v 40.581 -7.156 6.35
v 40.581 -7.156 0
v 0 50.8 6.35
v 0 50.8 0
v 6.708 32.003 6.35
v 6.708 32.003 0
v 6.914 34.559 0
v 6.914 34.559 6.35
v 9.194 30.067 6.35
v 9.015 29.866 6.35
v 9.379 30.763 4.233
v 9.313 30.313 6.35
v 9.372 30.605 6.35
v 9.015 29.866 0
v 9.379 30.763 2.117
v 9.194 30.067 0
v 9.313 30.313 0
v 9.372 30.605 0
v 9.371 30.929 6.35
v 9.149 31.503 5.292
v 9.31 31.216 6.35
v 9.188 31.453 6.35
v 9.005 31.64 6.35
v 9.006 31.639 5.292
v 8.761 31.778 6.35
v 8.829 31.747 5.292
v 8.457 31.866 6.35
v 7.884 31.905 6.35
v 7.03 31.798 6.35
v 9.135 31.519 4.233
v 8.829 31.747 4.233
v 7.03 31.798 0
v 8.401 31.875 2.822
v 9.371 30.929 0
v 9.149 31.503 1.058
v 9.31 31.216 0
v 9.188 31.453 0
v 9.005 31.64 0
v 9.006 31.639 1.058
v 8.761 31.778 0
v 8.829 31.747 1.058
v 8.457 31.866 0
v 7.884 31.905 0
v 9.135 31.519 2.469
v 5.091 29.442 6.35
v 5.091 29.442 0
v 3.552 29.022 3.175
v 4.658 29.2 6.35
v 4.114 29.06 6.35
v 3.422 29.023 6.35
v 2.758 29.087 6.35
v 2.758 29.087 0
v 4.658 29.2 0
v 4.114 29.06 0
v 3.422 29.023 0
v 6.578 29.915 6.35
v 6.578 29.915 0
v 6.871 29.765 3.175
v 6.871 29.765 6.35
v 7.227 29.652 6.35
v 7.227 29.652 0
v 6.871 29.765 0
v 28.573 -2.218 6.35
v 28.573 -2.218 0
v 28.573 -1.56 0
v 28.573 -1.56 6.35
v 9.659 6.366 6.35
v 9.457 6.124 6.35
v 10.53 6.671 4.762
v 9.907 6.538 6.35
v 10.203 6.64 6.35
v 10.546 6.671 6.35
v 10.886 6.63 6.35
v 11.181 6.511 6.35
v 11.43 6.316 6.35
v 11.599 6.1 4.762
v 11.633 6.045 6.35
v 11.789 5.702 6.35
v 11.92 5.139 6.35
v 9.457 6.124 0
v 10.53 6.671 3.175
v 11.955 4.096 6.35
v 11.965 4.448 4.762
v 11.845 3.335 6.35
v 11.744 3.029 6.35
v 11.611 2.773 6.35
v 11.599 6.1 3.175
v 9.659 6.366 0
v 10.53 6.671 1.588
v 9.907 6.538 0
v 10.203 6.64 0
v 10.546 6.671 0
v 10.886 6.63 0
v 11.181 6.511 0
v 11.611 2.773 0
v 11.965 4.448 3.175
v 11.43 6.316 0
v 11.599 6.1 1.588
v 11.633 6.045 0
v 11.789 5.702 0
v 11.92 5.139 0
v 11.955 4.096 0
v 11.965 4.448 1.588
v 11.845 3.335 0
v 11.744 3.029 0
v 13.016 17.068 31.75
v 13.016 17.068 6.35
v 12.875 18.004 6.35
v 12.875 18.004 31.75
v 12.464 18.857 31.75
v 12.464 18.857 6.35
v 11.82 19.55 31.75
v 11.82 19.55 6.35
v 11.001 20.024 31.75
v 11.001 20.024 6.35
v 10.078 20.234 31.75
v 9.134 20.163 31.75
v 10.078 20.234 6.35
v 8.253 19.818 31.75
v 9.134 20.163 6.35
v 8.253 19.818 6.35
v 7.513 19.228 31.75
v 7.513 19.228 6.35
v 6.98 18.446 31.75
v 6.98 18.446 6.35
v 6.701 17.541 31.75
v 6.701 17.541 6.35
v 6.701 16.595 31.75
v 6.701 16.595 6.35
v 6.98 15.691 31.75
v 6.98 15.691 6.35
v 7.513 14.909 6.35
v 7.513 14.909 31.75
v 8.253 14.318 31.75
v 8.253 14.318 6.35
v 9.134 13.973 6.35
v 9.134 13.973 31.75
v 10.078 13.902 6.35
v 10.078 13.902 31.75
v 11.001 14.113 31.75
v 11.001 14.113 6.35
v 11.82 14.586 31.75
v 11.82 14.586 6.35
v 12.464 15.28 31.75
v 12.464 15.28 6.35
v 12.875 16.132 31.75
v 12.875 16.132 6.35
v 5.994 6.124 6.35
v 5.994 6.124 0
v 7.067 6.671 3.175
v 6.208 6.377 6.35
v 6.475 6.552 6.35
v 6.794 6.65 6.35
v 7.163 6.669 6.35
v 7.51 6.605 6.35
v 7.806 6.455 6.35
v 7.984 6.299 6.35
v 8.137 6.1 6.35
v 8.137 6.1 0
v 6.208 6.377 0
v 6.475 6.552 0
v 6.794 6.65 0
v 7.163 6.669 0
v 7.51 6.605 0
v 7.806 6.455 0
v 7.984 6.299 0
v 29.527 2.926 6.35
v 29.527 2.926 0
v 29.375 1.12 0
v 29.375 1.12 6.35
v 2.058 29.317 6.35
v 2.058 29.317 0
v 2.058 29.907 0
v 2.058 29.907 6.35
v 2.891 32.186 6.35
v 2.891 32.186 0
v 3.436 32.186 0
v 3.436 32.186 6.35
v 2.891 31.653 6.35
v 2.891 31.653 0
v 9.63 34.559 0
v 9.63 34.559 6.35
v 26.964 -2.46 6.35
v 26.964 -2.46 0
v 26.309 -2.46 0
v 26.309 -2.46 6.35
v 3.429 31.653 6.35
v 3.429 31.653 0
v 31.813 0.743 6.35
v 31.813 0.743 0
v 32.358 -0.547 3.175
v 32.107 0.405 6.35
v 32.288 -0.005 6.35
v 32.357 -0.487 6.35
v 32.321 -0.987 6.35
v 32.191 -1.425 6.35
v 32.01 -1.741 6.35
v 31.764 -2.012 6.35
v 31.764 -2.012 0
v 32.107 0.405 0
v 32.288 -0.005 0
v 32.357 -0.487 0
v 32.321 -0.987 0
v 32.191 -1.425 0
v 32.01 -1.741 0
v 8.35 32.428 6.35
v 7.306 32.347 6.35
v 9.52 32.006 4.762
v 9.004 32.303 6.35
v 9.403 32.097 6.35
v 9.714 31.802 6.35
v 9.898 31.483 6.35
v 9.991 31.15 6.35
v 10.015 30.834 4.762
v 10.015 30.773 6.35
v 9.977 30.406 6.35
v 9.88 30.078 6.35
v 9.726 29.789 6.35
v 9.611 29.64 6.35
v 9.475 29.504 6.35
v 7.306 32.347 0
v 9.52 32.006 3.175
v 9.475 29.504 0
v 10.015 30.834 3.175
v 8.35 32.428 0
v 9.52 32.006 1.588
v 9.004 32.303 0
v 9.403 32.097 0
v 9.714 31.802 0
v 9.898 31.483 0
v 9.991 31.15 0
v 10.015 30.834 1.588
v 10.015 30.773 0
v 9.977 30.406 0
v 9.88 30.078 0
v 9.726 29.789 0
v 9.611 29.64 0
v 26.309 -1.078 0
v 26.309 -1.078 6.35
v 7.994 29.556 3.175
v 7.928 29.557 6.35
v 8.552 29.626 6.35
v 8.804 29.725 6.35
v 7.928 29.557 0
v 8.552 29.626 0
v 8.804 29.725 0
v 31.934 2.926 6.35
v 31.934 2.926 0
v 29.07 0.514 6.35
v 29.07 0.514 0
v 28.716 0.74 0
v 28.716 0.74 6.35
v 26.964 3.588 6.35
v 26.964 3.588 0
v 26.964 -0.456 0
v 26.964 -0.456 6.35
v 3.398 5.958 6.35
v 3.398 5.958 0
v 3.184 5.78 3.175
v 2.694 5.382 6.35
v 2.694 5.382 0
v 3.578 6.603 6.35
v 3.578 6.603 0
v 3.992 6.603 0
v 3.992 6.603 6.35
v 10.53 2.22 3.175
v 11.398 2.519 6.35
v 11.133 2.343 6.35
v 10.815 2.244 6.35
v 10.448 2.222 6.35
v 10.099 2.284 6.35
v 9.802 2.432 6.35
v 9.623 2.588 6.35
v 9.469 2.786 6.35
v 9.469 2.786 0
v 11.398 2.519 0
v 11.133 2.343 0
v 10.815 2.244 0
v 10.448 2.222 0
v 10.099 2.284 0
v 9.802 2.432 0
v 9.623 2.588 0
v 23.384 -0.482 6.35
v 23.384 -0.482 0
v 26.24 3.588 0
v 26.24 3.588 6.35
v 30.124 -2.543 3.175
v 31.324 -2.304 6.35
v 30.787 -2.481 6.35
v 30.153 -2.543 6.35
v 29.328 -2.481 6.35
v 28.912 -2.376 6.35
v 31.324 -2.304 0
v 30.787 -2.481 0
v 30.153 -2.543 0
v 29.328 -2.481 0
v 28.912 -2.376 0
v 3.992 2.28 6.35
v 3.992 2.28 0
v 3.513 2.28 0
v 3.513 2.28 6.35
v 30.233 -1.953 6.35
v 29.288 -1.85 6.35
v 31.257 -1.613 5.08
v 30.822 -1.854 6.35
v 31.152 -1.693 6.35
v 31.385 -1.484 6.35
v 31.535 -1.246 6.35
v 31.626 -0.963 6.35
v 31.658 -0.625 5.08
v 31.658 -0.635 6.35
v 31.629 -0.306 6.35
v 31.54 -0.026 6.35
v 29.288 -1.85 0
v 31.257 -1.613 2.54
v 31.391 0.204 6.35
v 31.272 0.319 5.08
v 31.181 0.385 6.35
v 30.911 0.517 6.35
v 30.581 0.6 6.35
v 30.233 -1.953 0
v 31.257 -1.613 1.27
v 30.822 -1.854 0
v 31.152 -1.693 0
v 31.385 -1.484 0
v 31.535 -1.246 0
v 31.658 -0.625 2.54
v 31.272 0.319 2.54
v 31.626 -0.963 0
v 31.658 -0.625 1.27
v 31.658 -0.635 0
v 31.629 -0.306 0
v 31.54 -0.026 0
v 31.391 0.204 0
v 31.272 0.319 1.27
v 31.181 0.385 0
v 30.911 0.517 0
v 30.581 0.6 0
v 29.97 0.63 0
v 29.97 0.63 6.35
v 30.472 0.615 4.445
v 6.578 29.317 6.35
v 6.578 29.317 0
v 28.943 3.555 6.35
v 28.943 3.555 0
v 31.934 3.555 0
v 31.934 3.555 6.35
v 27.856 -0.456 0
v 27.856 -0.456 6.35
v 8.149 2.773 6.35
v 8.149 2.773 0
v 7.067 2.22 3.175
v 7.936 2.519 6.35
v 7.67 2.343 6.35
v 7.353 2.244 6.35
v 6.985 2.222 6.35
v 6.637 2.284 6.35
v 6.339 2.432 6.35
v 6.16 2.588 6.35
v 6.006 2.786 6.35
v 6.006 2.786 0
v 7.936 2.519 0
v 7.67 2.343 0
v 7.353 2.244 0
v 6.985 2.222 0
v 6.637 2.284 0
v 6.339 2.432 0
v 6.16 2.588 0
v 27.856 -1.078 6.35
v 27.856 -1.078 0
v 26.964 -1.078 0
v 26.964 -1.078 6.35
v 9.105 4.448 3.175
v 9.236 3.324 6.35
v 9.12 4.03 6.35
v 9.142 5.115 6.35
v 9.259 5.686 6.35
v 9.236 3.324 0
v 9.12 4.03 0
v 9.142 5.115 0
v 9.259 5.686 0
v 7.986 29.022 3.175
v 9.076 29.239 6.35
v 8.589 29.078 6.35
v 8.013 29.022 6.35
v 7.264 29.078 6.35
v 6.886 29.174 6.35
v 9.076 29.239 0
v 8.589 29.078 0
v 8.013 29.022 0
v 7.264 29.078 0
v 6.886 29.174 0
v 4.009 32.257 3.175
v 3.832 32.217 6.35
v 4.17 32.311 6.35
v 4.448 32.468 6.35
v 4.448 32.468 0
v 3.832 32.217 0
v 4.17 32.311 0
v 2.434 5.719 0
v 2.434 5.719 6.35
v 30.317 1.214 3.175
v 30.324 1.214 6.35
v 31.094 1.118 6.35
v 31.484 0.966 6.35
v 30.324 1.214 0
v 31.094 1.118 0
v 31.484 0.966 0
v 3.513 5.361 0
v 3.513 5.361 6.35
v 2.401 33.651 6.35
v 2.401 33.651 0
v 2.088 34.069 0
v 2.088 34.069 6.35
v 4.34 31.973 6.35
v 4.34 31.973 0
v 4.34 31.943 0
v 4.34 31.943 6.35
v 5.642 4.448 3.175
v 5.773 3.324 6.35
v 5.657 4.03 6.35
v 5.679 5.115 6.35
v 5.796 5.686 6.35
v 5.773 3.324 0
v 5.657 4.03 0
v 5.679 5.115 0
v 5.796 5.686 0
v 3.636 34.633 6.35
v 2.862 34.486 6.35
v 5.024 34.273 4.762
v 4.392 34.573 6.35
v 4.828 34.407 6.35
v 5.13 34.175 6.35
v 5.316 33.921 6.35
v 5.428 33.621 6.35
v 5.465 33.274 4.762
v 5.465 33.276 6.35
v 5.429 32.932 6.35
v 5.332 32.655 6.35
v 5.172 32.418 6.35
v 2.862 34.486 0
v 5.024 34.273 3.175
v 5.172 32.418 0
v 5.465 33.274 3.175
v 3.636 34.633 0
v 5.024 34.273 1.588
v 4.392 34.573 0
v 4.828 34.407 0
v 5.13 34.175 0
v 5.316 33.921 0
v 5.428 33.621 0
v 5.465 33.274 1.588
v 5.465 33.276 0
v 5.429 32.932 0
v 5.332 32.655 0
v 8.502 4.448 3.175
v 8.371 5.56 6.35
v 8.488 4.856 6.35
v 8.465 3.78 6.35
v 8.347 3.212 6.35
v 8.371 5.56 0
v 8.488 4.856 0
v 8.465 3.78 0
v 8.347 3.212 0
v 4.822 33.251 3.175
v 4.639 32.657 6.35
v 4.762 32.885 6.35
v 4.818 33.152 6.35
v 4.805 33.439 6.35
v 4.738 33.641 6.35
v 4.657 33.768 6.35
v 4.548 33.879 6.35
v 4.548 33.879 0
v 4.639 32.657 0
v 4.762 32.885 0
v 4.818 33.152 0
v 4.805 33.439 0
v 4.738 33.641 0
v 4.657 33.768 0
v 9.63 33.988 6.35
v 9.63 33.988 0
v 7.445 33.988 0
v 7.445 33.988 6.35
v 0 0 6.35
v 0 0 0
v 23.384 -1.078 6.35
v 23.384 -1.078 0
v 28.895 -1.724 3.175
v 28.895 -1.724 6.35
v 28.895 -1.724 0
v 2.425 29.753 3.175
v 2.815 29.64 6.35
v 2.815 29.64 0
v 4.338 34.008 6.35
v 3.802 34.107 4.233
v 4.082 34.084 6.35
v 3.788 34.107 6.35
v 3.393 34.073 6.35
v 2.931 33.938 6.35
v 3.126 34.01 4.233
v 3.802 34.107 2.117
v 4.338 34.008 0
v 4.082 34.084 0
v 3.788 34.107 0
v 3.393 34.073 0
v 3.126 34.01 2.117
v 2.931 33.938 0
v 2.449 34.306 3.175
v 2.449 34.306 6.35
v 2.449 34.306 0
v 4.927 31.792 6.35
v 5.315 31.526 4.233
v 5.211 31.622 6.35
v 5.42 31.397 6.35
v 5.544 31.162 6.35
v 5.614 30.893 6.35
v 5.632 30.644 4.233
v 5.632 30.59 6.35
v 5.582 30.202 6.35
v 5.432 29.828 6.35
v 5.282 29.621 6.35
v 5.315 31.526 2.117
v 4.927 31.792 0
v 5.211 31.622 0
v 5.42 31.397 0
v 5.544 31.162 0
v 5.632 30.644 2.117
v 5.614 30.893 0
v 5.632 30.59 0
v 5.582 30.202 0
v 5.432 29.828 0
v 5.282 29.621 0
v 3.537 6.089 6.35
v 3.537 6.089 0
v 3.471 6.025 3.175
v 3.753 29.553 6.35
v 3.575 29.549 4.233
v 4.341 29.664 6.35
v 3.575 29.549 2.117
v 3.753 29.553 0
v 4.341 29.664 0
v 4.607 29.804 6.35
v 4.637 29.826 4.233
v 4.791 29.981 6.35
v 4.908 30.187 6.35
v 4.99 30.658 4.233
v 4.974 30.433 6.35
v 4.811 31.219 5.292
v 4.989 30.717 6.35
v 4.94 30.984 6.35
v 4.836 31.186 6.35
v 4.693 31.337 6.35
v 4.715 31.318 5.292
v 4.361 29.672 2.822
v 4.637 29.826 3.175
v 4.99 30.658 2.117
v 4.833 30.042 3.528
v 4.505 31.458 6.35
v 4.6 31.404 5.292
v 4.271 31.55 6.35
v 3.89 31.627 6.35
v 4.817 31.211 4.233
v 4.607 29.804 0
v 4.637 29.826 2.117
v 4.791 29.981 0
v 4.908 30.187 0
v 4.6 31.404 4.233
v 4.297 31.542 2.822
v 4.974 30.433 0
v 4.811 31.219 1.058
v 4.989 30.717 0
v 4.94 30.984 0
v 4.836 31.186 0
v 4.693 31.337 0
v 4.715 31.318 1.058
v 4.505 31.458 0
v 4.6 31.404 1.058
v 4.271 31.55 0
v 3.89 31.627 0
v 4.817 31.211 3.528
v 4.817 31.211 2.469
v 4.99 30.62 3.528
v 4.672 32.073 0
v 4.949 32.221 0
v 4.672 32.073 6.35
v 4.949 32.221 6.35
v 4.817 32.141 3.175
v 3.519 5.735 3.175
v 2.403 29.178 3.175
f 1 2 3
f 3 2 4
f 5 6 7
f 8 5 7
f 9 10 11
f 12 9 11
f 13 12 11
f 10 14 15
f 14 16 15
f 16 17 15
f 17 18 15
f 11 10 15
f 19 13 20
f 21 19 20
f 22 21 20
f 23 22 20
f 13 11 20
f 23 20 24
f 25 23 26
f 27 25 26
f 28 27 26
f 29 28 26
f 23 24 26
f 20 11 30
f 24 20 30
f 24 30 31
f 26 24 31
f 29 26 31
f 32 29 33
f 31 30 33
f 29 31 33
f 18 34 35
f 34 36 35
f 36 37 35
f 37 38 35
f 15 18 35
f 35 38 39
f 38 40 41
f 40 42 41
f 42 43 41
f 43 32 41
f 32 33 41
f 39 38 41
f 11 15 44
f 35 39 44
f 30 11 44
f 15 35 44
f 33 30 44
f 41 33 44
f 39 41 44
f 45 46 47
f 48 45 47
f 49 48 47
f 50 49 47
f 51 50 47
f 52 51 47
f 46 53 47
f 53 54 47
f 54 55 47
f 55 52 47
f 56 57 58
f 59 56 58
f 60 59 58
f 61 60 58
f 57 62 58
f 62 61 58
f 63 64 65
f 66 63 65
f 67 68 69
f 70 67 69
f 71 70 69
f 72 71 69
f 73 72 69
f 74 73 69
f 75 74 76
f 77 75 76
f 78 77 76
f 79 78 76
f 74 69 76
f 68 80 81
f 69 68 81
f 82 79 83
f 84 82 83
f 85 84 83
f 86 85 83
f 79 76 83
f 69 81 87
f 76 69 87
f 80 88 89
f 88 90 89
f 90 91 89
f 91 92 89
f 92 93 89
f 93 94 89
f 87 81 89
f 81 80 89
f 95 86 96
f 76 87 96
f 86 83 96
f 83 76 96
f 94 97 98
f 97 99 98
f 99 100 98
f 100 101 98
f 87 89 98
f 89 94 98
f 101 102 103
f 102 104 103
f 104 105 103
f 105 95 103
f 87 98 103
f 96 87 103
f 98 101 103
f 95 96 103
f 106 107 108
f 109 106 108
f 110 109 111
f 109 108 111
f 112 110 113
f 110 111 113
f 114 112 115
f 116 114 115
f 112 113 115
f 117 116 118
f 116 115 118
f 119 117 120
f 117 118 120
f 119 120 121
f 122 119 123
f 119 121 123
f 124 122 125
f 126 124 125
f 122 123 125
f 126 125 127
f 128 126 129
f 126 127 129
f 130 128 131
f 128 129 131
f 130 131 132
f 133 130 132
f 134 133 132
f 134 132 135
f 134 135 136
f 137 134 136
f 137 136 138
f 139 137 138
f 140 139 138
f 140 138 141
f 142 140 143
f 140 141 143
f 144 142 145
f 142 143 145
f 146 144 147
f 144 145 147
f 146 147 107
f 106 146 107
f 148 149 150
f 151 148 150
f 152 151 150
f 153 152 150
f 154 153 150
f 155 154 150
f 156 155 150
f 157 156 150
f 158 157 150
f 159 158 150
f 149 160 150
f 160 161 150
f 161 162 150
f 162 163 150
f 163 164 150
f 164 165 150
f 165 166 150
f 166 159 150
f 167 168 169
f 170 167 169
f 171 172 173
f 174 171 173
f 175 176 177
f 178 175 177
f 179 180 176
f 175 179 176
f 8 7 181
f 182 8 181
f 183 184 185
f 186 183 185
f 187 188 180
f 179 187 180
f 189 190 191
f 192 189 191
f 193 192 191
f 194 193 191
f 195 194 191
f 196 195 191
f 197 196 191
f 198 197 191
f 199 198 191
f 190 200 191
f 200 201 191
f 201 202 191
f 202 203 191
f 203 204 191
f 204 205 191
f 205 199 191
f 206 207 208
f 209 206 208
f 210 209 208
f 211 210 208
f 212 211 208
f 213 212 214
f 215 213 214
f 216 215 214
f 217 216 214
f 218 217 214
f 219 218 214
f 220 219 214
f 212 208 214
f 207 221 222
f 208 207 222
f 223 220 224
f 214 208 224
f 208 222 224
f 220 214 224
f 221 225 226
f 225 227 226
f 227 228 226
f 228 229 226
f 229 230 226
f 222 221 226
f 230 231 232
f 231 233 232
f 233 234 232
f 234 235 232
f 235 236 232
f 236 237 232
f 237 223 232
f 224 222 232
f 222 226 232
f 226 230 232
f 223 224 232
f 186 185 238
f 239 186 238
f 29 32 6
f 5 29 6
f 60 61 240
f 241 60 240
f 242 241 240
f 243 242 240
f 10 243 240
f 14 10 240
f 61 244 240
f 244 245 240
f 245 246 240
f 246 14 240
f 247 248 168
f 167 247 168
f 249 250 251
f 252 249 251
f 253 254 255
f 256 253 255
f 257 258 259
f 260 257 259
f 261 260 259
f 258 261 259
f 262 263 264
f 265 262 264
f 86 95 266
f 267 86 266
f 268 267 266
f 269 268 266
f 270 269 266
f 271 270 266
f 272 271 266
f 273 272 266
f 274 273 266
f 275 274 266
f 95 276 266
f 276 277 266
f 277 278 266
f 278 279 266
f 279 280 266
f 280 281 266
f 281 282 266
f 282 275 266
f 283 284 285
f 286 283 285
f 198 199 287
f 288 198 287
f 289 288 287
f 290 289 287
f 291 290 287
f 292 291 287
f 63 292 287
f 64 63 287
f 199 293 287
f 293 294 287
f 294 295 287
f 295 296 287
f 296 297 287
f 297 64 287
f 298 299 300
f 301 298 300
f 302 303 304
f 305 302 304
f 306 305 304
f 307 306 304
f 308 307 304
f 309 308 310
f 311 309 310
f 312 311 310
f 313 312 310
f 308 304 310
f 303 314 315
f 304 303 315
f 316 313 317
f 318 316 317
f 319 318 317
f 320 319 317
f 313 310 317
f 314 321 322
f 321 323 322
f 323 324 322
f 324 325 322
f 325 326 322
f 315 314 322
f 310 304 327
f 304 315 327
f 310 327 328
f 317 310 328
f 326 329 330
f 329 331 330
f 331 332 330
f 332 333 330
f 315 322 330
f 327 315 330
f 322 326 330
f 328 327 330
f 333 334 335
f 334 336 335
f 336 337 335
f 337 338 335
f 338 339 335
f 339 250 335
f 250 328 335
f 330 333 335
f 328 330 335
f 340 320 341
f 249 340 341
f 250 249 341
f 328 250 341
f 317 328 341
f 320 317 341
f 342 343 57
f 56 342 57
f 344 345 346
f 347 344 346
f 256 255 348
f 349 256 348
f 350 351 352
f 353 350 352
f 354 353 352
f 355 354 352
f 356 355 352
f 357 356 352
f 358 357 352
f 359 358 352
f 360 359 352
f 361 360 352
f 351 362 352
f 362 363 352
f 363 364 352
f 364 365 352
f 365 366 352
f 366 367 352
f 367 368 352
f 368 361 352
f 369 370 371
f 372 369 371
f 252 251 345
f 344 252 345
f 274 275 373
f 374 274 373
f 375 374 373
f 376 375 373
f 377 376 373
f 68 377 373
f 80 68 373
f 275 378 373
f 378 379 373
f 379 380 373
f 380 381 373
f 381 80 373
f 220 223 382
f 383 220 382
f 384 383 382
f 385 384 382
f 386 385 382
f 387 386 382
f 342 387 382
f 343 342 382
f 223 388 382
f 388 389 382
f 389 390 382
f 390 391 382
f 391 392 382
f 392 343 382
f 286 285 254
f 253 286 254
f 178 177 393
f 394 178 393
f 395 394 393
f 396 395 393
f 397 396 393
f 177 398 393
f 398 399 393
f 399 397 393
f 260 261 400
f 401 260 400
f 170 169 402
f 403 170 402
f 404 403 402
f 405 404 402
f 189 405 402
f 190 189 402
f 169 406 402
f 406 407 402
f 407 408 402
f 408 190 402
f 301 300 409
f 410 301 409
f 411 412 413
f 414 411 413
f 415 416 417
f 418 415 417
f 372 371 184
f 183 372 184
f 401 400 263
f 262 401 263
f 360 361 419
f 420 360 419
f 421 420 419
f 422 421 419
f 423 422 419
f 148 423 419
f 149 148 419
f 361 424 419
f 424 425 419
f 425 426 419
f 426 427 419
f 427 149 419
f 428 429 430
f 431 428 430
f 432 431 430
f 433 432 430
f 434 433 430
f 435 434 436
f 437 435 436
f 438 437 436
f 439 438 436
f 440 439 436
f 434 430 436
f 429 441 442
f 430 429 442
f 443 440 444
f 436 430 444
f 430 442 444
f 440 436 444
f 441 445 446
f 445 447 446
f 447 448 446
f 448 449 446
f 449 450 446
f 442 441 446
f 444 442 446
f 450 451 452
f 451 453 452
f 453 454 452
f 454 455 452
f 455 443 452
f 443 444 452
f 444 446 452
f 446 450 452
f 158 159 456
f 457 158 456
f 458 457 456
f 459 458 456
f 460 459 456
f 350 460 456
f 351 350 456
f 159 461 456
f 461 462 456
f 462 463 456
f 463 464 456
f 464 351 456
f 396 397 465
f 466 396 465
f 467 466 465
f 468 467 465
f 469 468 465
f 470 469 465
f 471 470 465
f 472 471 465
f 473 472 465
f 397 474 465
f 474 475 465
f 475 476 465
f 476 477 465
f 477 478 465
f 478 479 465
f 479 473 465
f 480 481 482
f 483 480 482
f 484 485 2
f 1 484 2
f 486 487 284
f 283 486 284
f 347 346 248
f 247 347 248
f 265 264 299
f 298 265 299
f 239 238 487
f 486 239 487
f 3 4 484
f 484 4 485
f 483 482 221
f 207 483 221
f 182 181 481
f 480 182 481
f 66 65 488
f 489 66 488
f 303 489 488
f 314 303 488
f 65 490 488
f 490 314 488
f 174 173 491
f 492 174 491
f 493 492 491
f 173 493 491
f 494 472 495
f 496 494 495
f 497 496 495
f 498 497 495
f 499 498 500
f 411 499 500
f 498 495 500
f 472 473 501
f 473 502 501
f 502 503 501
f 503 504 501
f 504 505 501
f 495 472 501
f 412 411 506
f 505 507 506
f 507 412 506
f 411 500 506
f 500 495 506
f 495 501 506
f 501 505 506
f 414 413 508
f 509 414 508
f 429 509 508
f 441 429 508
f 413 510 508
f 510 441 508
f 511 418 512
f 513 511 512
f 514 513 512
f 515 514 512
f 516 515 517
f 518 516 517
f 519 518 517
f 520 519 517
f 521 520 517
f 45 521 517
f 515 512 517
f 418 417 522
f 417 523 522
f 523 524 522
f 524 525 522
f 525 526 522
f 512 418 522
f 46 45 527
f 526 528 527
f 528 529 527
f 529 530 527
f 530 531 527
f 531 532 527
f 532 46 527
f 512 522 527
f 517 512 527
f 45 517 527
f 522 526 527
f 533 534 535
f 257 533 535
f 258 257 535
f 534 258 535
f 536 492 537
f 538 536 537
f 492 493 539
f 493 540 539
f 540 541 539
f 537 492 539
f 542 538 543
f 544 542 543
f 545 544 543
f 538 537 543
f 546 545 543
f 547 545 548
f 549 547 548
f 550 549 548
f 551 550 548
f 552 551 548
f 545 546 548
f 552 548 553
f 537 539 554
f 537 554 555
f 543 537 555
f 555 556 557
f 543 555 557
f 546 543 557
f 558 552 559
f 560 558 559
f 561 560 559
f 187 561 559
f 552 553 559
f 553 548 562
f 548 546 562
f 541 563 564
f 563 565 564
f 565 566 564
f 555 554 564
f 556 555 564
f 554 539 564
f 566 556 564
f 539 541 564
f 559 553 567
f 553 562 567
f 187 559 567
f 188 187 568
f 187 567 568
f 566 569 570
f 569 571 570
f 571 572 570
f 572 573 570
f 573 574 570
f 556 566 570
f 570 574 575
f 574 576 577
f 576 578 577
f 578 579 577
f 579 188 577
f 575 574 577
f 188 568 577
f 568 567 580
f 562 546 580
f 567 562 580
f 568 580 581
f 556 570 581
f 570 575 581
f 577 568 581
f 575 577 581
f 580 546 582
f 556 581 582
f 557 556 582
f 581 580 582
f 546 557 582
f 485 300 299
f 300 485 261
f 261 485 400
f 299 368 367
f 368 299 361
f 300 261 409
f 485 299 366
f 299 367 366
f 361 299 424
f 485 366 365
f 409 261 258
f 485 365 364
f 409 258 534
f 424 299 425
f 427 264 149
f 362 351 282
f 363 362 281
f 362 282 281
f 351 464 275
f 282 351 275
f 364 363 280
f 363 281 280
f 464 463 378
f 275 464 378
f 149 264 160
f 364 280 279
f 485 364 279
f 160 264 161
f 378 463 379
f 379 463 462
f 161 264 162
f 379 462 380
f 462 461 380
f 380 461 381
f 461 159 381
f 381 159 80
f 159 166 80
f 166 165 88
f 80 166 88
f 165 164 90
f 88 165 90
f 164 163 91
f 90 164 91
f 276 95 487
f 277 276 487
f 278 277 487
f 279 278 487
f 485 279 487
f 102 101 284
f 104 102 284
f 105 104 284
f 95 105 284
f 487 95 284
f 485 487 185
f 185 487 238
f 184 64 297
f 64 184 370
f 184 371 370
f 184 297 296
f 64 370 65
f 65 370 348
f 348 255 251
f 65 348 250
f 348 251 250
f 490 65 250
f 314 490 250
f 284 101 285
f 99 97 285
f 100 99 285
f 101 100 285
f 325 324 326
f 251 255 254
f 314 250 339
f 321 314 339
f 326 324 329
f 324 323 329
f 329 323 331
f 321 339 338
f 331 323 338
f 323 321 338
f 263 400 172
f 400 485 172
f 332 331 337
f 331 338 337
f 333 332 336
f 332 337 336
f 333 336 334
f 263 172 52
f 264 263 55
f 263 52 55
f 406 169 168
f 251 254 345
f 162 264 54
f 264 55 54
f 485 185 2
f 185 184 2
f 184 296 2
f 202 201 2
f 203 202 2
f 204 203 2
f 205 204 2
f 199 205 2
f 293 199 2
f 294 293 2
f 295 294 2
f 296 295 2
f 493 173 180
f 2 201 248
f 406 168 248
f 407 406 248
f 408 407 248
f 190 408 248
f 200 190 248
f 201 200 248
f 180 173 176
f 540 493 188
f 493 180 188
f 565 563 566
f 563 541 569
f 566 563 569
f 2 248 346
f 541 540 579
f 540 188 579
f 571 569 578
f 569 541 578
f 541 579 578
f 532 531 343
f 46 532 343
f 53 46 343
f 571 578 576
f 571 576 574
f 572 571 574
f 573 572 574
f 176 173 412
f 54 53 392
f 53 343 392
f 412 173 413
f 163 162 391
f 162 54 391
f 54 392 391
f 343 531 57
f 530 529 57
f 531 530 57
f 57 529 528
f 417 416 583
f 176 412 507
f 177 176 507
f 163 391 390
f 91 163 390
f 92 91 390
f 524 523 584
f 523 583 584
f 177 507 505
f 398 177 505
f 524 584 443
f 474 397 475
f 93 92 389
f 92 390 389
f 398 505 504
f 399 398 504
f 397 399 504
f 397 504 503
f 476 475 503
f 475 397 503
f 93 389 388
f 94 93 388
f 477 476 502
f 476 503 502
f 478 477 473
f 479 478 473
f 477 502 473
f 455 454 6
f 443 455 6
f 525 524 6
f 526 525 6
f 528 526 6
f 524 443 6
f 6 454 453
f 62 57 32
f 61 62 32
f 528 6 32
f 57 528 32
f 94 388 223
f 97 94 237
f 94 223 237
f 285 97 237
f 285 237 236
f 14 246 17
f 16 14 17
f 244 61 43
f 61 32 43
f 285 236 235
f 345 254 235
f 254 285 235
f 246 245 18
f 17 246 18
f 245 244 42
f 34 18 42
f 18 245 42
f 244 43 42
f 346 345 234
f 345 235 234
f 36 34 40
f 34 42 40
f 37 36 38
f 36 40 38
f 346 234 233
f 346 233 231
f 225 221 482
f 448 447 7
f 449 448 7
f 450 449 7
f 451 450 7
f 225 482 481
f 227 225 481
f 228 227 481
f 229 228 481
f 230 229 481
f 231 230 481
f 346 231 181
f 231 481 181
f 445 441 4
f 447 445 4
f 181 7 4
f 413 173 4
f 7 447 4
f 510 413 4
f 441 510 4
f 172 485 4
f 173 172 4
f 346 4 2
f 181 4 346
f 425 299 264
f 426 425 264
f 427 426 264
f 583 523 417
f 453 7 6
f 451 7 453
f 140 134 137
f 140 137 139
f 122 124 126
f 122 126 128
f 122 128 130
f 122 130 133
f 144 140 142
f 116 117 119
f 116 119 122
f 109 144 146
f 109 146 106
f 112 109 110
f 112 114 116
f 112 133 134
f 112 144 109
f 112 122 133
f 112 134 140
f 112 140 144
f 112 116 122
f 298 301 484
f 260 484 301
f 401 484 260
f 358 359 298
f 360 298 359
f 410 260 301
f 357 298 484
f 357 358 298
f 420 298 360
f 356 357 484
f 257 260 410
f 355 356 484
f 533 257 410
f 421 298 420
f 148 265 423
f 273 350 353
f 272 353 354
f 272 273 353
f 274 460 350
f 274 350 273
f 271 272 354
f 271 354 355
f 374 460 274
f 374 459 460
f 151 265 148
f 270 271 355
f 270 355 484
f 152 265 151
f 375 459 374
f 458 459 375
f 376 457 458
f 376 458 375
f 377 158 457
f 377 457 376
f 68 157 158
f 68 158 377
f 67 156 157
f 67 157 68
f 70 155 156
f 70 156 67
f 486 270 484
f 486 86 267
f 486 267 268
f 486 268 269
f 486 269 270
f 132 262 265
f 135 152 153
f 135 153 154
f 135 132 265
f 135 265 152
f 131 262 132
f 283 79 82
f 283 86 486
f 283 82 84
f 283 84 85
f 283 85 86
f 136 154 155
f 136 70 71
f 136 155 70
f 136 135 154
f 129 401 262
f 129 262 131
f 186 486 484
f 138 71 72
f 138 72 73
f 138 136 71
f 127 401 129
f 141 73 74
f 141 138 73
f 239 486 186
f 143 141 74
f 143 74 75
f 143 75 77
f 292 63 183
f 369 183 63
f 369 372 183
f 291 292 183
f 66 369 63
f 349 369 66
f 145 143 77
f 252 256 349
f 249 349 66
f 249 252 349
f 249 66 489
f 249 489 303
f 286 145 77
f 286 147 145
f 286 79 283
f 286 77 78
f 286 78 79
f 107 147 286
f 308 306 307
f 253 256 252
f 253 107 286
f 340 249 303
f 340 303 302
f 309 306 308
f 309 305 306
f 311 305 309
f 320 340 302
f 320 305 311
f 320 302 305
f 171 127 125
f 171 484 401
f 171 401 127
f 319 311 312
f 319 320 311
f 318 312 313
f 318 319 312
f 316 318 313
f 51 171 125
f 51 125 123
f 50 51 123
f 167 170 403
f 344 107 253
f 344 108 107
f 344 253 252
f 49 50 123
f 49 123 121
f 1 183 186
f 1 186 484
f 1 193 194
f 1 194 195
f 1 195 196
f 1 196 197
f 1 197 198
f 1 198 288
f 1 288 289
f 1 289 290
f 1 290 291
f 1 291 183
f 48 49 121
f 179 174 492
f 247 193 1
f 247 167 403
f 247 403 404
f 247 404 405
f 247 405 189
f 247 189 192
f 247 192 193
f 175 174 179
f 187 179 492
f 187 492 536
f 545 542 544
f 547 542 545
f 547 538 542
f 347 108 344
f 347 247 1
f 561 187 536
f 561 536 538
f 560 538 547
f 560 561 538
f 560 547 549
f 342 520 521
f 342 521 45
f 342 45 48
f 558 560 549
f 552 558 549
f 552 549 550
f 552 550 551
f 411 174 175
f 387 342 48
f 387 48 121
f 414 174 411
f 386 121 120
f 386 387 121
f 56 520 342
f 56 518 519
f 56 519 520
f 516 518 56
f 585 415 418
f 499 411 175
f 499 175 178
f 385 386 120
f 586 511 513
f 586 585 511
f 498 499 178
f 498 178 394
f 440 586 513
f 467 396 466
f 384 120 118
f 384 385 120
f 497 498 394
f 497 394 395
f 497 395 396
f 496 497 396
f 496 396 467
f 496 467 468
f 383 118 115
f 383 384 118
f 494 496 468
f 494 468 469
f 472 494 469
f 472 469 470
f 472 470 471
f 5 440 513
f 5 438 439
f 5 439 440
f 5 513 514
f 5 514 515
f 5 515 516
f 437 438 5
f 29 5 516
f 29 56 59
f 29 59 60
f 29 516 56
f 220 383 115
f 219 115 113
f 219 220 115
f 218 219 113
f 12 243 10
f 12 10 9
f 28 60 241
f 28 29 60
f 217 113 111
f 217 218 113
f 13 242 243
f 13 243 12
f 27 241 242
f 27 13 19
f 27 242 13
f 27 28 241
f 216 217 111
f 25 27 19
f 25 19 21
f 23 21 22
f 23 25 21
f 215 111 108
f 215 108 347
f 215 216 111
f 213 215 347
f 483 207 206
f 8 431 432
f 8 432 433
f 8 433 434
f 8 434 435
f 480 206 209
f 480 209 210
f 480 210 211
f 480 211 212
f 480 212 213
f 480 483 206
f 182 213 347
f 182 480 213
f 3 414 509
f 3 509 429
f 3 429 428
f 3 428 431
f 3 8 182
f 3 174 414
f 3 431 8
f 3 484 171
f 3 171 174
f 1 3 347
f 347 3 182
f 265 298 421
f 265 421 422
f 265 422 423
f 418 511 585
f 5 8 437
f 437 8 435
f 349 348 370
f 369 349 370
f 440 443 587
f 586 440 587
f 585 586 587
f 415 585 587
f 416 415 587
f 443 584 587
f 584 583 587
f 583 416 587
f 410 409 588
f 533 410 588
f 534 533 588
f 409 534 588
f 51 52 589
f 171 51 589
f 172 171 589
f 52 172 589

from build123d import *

# Parameters (mm, degrees)
F1_DEPTH = 6.35
F2_R     = 3.175
F3_DEPTH = 25.4


with BuildPart() as f1:
    # F0 (on Top) → F1 (new body)
    with BuildSketch(Plane.XY):
        Polygon((0, 50.8), (0, 0), (40.5808809275, -7.1555042084), align=None)
        with BuildLine():
            Line((3.9918560175, 6.6033309618), (3.9918560175, 2.2795035038))
            Line((3.9918560175, 2.2795035038), (3.5130079777, 2.2795035038))
            Line((3.5130079777, 2.2795035038), (3.5130079777, 5.3607865423))
            add(Edge.make_bspline(
                [(3.5130079777, 5.3607865423), (3.5130079777, 5.7459469222), (3.5366664777, 6.088522002)],
                knots=[0, 0, 0, 1, 1, 1], degree=2))
            add(Edge.make_bspline(
                [(3.5366664777, 6.088522002), (3.4751543778, 6.026063562), (3.3980276678, 5.9584002521)],
                knots=[0, 0, 0, 1, 1, 1], degree=2))
            add(Edge.make_bspline(
                [(3.3980276678, 5.9584002521), (3.3209009578, 5.8907369421), (2.6944238781, 5.3816060223)],
                knots=[0, 0, 0, 1, 1, 1], degree=2))
            Line((2.6944238781, 5.3816060223), (2.4341803783, 5.7185030622))
            Line((2.4341803783, 5.7185030622), (3.5783054377, 6.6033309618))
            Line((3.5783054377, 6.6033309618), (3.9918560175, 6.6033309618))
        make_face(mode=Mode.SUBTRACT)
        with BuildLine():
            add(Edge.make_bspline(
                [(8.1368252155, 6.100351252), (8.5021124554, 5.5292350623), (8.5021124554, 4.4475684428)],
                knots=[0, 0, 0, 1, 1, 1], degree=2))
            add(Edge.make_bspline(
                [(8.5021124554, 4.4475684428), (8.5021124554, 3.3261555433), (8.1486544655, 2.7730198136)],
                knots=[0, 0, 0, 1, 1, 1], degree=2))
            add(Edge.make_bspline(
                [(8.1486544655, 2.7730198136), (7.7951964757, 2.2198840838), (7.067461016, 2.2198840838)],
                knots=[0, 0, 0, 1, 1, 1], degree=2))
            add(Edge.make_bspline(
                [(7.067461016, 2.2198840838), (6.3700084364, 2.2198840838), (6.0061407066, 2.7862685736)],
                knots=[0, 0, 0, 1, 1, 1], degree=2))
            add(Edge.make_bspline(
                [(6.0061407066, 2.7862685736), (5.6422729767, 3.3526530633), (5.6422729767, 4.4475684428)],
                knots=[0, 0, 0, 1, 1, 1], degree=2))
            add(Edge.make_bspline(
                [(5.6422729767, 4.4475684428), (5.6422729767, 5.5765520622), (5.9943114566, 6.124009752)],
                knots=[0, 0, 0, 1, 1, 1], degree=2))
            add(Edge.make_bspline(
                [(5.9943114566, 6.124009752), (6.3463499364, 6.6714674417), (7.067461016, 6.6714674417)],
                knots=[0, 0, 0, 1, 1, 1], degree=2))
            add(Edge.make_bspline(
                [(7.067461016, 6.6714674417), (7.7715379757, 6.6714674417), (8.1368252155, 6.100351252)],
                knots=[0, 0, 0, 1, 1, 1], degree=2))
        make_face(mode=Mode.SUBTRACT)
        with BuildLine():
            add(Edge.make_bspline(
                [(11.5994832739, 6.100351252), (11.9647705137, 5.5292350623), (11.9647705137, 4.4475684428)],
                knots=[0, 0, 0, 1, 1, 1], degree=2))
            add(Edge.make_bspline(
                [(11.9647705137, 4.4475684428), (11.9647705137, 3.3261555433), (11.6113125239, 2.7730198136)],
                knots=[0, 0, 0, 1, 1, 1], degree=2))
            add(Edge.make_bspline(
                [(11.6113125239, 2.7730198136), (11.2578545341, 2.2198840838), (10.5301190744, 2.2198840838)],
                knots=[0, 0, 0, 1, 1, 1], degree=2))
            add(Edge.make_bspline(
                [(10.5301190744, 2.2198840838), (9.8326664947, 2.2198840838), (9.4687987649, 2.7862685736)],
                knots=[0, 0, 0, 1, 1, 1], degree=2))
            add(Edge.make_bspline(
                [(9.4687987649, 2.7862685736), (9.1049310351, 3.3526530633), (9.1049310351, 4.4475684428)],
                knots=[0, 0, 0, 1, 1, 1], degree=2))
            add(Edge.make_bspline(
                [(9.1049310351, 4.4475684428), (9.1049310351, 5.5765520622), (9.4569695149, 6.124009752)],
                knots=[0, 0, 0, 1, 1, 1], degree=2))
            add(Edge.make_bspline(
                [(9.4569695149, 6.124009752), (9.8090079947, 6.6714674417), (10.5301190744, 6.6714674417)],
                knots=[0, 0, 0, 1, 1, 1], degree=2))
            add(Edge.make_bspline(
                [(10.5301190744, 6.6714674417), (11.2341960341, 6.6714674417), (11.5994832739, 6.100351252)],
                knots=[0, 0, 0, 1, 1, 1], degree=2))
        make_face(mode=Mode.SUBTRACT)
        Polygon((27.8564916644, -0.4564887798), (27.8564916644, -1.0779461554), (26.9638050104, -1.0779461554), (26.9638050104, -2.4604254868), (26.3094314602, -2.4604254868), (26.3094314602, -1.0779461554), (23.3838418656, -1.0779461554), (23.3838418656, -0.4815050725), (26.2396491701, 3.5882507497), (26.9638050104, 3.5882507497), (26.9638050104, -0.4564887798), align=None, mode=Mode.SUBTRACT)
        with BuildLine():
            add(Edge.make_bspline(
                [(29.3745856349, 1.119537658), (29.8472619015, 1.2143362407), (30.3173048742, 1.2143362407)],
                knots=[0, 0, 0, 1, 1, 1], degree=2))
            add(Edge.make_bspline(
                [(30.3173048742, 1.2143362407), (31.2679239954, 1.2143362407), (31.813015846, 0.742976621)],
                knots=[0, 0, 0, 1, 1, 1], degree=2))
            add(Edge.make_bspline(
                [(31.813015846, 0.742976621), (32.3581076967, 0.2716170014), (32.3581076967, -0.5473374216)],
                knots=[0, 0, 0, 1, 1, 1], degree=2))
            add(Edge.make_bspline(
                [(32.3581076967, -0.5473374216), (32.3581076967, -1.480840132), (31.7636415842, -2.0121071893)],
                knots=[0, 0, 0, 1, 1, 1], degree=2))
            add(Edge.make_bspline(
                [(31.7636415842, -2.0121071893), (31.1691754717, -2.5433742467), (30.1237577678, -2.5433742467)],
                knots=[0, 0, 0, 1, 1, 1], degree=2))
            add(Edge.make_bspline(
                [(30.1237577678, -2.5433742467), (29.1073062975, -2.5433742467), (28.5727476227, -2.2181624421)],
                knots=[0, 0, 0, 1, 1, 1], degree=2))
            Line((28.5727476227, -2.2181624421), (28.5727476227, -1.5598389509))
            add(Edge.make_bspline(
                [(28.5727476227, -1.5598389509), (28.8597766648, -1.7441695284), (29.2876869341, -1.849501287)],
                knots=[0, 0, 0, 1, 1, 1], degree=2))
            add(Edge.make_bspline(
                [(29.2876869341, -1.849501287), (29.7155972033, -1.9548330456), (30.1316576497, -1.9548330456)],
                knots=[0, 0, 0, 1, 1, 1], degree=2))
            add(Edge.make_bspline(
                [(30.1316576497, -1.9548330456), (30.8558134899, -1.9548330456), (31.256732496, -1.6131631537)],
                knots=[0, 0, 0, 1, 1, 1], degree=2))
            add(Edge.make_bspline(
                [(31.256732496, -1.6131631537), (31.6576515021, -1.2714932618), (31.6576515021, -0.6250195935)],
                knots=[0, 0, 0, 1, 1, 1], degree=2))
            add(Edge.make_bspline(
                [(31.6576515021, -0.6250195935), (31.6576515021, 0.6336949215), (30.1158578859, 0.6336949215)],
                knots=[0, 0, 0, 1, 1, 1], degree=2))
            add(Edge.make_bspline(
                [(30.1158578859, 0.6336949215), (29.7248137322, 0.6336949215), (29.070440182, 0.5138800461)],
                knots=[0, 0, 0, 1, 1, 1], degree=2))
            Line((29.070440182, 0.5138800461), (28.7162621438, 0.7403433271))
            Line((28.7162621438, 0.7403433271), (28.9427254247, 3.5553345751))
            Line((28.9427254247, 3.5553345751), (31.9341473684, 3.5553345751))
            Line((31.9341473684, 3.5553345751), (31.9341473684, 2.9259773176))
            Line((31.9341473684, 2.9259773176), (29.5273166848, 2.9259773176))
            Line((29.5273166848, 2.9259773176), (29.3745856349, 1.119537658))
        make_face(mode=Mode.SUBTRACT)
        with BuildLine():
            add(Edge.make_bspline(
                [(5.0239537206, 34.2728606786), (5.4651021183, 33.9088235862), (5.4651021183, 33.2740002822)],
                knots=[0, 0, 0, 1, 1, 1], degree=2))
            add(Edge.make_bspline(
                [(5.4651021183, 33.2740002822), (5.4651021183, 32.7503607207), (5.1716009486, 32.4180050173)],
                knots=[0, 0, 0, 1, 1, 1], degree=2))
            add(Edge.make_bspline(
                [(5.1716009486, 32.4180050173), (4.8780997788, 32.0856493139), (4.340113928, 31.9732700473)],
                knots=[0, 0, 0, 1, 1, 1], degree=2))
            Line((4.340113928, 31.9732700473), (4.340113928, 31.9433819444))
            add(Edge.make_bspline(
                [(4.340113928, 31.9433819444), (4.9976521901, 31.8620863047), (5.3150638421, 31.5255462669)],
                knots=[0, 0, 0, 1, 1, 1], degree=2))
            add(Edge.make_bspline(
                [(5.3150638421, 31.5255462669), (5.6324754941, 31.1890062291), (5.6324754941, 30.6438472336)],
                knots=[0, 0, 0, 1, 1, 1], degree=2))
            add(Edge.make_bspline(
                [(5.6324754941, 30.6438472336), (5.6324754941, 29.8631699879), (5.0909030709, 29.4423455001)],
                knots=[0, 0, 0, 1, 1, 1], degree=2))
            add(Edge.make_bspline(
                [(5.0909030709, 29.4423455001), (4.5493306478, 29.0215210123), (3.5522635375, 29.0215210123)],
                knots=[0, 0, 0, 1, 1, 1], degree=2))
            add(Edge.make_bspline(
                [(3.5522635375, 29.0215210123), (3.1182882845, 29.0215210123), (2.7578377645, 29.0872748385)],
                knots=[0, 0, 0, 1, 1, 1], degree=2))
            add(Edge.make_bspline(
                [(2.7578377645, 29.0872748385), (2.3973872444, 29.1530286648), (2.0578583963, 29.3168154682)],
                knots=[0, 0, 0, 1, 1, 1], degree=2))
            Line((2.0578583963, 29.3168154682), (2.0578583963, 29.90740438))
            add(Edge.make_bspline(
                [(2.0578583963, 29.90740438), (2.4129290579, 29.7316623354), (2.8146251598, 29.6402047408)],
                knots=[0, 0, 0, 1, 1, 1], degree=2))
            add(Edge.make_bspline(
                [(2.8146251598, 29.6402047408), (3.2163212618, 29.5487471461), (3.5749784957, 29.5487471461)],
                knots=[0, 0, 0, 1, 1, 1], degree=2))
            add(Edge.make_bspline(
                [(3.5749784957, 29.5487471461), (4.9904790454, 29.5487471461), (4.9904790454, 30.658193523)],
                knots=[0, 0, 0, 1, 1, 1], degree=2))
            add(Edge.make_bspline(
                [(4.9904790454, 30.658193523), (4.9904790454, 31.652869585), (3.4291245539, 31.652869585)],
                knots=[0, 0, 0, 1, 1, 1], degree=2))
            Line((3.4291245539, 31.652869585), (2.8911387031, 31.652869585))
            Line((2.8911387031, 31.652869585), (2.8911387031, 32.1860733394))
            Line((2.8911387031, 32.1860733394), (3.4362976986, 32.1860733394))
            add(Edge.make_bspline(
                [(3.4362976986, 32.1860733394), (4.0747075749, 32.1860733394), (4.4483088602, 32.46821703)],
                knots=[0, 0, 0, 1, 1, 1], degree=2))
            add(Edge.make_bspline(
                [(4.4483088602, 32.46821703), (4.8219101455, 32.7503607207), (4.8219101455, 33.251285324)],
                knots=[0, 0, 0, 1, 1, 1], degree=2))
            add(Edge.make_bspline(
                [(4.8219101455, 33.251285324), (4.8219101455, 33.6505903778), (4.5475373616, 33.8789354833)],
                knots=[0, 0, 0, 1, 1, 1], degree=2))
            add(Edge.make_bspline(
                [(4.5475373616, 33.8789354833), (4.2731645777, 34.1072805889), (3.8021280771, 34.1072805889)],
                knots=[0, 0, 0, 1, 1, 1], degree=2))
            add(Edge.make_bspline(
                [(3.8021280771, 34.1072805889), (3.4434708433, 34.1072805889), (3.1260591913, 34.0098453737)],
                knots=[0, 0, 0, 1, 1, 1], degree=2))
            add(Edge.make_bspline(
                [(3.1260591913, 34.0098453737), (2.8086475393, 33.9124101585), (2.4009738167, 33.6505903778)],
                knots=[0, 0, 0, 1, 1, 1], degree=2))
            Line((2.4009738167, 33.6505903778), (2.0877464991, 34.0690238173))
            add(Edge.make_bspline(
                [(2.0877464991, 34.0690238173), (2.4236887749, 34.3344301704), (2.8624461243, 34.4856639707)],
                knots=[0, 0, 0, 1, 1, 1], degree=2))
            add(Edge.make_bspline(
                [(2.8624461243, 34.4856639707), (3.3012034738, 34.636897771), (3.7877817878, 34.636897771)],
                knots=[0, 0, 0, 1, 1, 1], degree=2))
            add(Edge.make_bspline(
                [(3.7877817878, 34.636897771), (4.5828053229, 34.636897771), (5.0239537206, 34.2728606786)],
                knots=[0, 0, 0, 1, 1, 1], degree=2))
        make_face(mode=Mode.SUBTRACT)
        with BuildLine():
            add(Edge.make_bspline(
                [(7.3062092523, 32.3474690946), (7.7354024088, 32.4335468307), (8.1622045171, 32.4335468307)],
                knots=[0, 0, 0, 1, 1, 1], degree=2))
            add(Edge.make_bspline(
                [(8.1622045171, 32.4335468307), (9.0253729267, 32.4335468307), (9.5203199095, 32.0055491983)],
                knots=[0, 0, 0, 1, 1, 1], degree=2))
            add(Edge.make_bspline(
                [(9.5203199095, 32.0055491983), (10.0152668923, 31.5775515659), (10.0152668923, 30.8339355676)],
                knots=[0, 0, 0, 1, 1, 1], degree=2))
            add(Edge.make_bspline(
                [(10.0152668923, 30.8339355676), (10.0152668923, 29.9863089715), (9.4754877552, 29.5039149919)],
                knots=[0, 0, 0, 1, 1, 1], degree=2))
            add(Edge.make_bspline(
                [(9.4754877552, 29.5039149919), (8.9357086182, 29.0215210123), (7.9864624725, 29.0215210123)],
                knots=[0, 0, 0, 1, 1, 1], degree=2))
            add(Edge.make_bspline(
                [(7.9864624725, 29.0215210123), (7.0635178573, 29.0215210123), (6.5781350675, 29.3168154682)],
                knots=[0, 0, 0, 1, 1, 1], degree=2))
            Line((6.5781350675, 29.3168154682), (6.5781350675, 29.9145775247))
            add(Edge.make_bspline(
                [(6.5781350675, 29.9145775247), (6.8387593241, 29.7472041489), (7.2273046608, 29.6515622199)],
                knots=[0, 0, 0, 1, 1, 1], degree=2))
            add(Edge.make_bspline(
                [(7.2273046608, 29.6515622199), (7.6158499975, 29.5559202908), (7.9936356172, 29.5559202908)],
                knots=[0, 0, 0, 1, 1, 1], degree=2))
            add(Edge.make_bspline(
                [(7.9936356172, 29.5559202908), (8.6511738794, 29.5559202908), (9.0152109718, 29.8661587981)],
                knots=[0, 0, 0, 1, 1, 1], degree=2))
            add(Edge.make_bspline(
                [(9.0152109718, 29.8661587981), (9.3792480642, 30.1763973055), (9.3792480642, 30.7633996449)],
                knots=[0, 0, 0, 1, 1, 1], degree=2))
            add(Edge.make_bspline(
                [(9.3792480642, 30.7633996449), (9.3792480642, 31.9063206969), (7.9792893279, 31.9063206969)],
                knots=[0, 0, 0, 1, 1, 1], degree=2))
            add(Edge.make_bspline(
                [(7.9792893279, 31.9063206969), (7.6242186663, 31.9063206969), (7.0300431822, 31.7975280026)],
                knots=[0, 0, 0, 1, 1, 1], degree=2))
            Line((7.0300431822, 31.7975280026), (6.7084471958, 32.0031581501))
            Line((6.7084471958, 32.0031581501), (6.9140773432, 34.5591887036))
            Line((6.9140773432, 34.5591887036), (9.6303081279, 34.5591887036))
            Line((9.6303081279, 34.5591887036), (9.6303081279, 33.9877281776))
            Line((9.6303081279, 33.9877281776), (7.4448900494, 33.9877281776))
            Line((7.4448900494, 33.9877281776), (7.3062092523, 32.3474690946))
        make_face(mode=Mode.SUBTRACT)
    extrude(amount=F1_DEPTH)

    # F2 (on face) → F3 (join)
    with BuildSketch(Plane.XY.offset(6.35)):
        with Locations((9.8408134654, 17.0680824667)):
            Circle(F2_R)
    extrude(amount=F3_DEPTH)


solid = f1.part
